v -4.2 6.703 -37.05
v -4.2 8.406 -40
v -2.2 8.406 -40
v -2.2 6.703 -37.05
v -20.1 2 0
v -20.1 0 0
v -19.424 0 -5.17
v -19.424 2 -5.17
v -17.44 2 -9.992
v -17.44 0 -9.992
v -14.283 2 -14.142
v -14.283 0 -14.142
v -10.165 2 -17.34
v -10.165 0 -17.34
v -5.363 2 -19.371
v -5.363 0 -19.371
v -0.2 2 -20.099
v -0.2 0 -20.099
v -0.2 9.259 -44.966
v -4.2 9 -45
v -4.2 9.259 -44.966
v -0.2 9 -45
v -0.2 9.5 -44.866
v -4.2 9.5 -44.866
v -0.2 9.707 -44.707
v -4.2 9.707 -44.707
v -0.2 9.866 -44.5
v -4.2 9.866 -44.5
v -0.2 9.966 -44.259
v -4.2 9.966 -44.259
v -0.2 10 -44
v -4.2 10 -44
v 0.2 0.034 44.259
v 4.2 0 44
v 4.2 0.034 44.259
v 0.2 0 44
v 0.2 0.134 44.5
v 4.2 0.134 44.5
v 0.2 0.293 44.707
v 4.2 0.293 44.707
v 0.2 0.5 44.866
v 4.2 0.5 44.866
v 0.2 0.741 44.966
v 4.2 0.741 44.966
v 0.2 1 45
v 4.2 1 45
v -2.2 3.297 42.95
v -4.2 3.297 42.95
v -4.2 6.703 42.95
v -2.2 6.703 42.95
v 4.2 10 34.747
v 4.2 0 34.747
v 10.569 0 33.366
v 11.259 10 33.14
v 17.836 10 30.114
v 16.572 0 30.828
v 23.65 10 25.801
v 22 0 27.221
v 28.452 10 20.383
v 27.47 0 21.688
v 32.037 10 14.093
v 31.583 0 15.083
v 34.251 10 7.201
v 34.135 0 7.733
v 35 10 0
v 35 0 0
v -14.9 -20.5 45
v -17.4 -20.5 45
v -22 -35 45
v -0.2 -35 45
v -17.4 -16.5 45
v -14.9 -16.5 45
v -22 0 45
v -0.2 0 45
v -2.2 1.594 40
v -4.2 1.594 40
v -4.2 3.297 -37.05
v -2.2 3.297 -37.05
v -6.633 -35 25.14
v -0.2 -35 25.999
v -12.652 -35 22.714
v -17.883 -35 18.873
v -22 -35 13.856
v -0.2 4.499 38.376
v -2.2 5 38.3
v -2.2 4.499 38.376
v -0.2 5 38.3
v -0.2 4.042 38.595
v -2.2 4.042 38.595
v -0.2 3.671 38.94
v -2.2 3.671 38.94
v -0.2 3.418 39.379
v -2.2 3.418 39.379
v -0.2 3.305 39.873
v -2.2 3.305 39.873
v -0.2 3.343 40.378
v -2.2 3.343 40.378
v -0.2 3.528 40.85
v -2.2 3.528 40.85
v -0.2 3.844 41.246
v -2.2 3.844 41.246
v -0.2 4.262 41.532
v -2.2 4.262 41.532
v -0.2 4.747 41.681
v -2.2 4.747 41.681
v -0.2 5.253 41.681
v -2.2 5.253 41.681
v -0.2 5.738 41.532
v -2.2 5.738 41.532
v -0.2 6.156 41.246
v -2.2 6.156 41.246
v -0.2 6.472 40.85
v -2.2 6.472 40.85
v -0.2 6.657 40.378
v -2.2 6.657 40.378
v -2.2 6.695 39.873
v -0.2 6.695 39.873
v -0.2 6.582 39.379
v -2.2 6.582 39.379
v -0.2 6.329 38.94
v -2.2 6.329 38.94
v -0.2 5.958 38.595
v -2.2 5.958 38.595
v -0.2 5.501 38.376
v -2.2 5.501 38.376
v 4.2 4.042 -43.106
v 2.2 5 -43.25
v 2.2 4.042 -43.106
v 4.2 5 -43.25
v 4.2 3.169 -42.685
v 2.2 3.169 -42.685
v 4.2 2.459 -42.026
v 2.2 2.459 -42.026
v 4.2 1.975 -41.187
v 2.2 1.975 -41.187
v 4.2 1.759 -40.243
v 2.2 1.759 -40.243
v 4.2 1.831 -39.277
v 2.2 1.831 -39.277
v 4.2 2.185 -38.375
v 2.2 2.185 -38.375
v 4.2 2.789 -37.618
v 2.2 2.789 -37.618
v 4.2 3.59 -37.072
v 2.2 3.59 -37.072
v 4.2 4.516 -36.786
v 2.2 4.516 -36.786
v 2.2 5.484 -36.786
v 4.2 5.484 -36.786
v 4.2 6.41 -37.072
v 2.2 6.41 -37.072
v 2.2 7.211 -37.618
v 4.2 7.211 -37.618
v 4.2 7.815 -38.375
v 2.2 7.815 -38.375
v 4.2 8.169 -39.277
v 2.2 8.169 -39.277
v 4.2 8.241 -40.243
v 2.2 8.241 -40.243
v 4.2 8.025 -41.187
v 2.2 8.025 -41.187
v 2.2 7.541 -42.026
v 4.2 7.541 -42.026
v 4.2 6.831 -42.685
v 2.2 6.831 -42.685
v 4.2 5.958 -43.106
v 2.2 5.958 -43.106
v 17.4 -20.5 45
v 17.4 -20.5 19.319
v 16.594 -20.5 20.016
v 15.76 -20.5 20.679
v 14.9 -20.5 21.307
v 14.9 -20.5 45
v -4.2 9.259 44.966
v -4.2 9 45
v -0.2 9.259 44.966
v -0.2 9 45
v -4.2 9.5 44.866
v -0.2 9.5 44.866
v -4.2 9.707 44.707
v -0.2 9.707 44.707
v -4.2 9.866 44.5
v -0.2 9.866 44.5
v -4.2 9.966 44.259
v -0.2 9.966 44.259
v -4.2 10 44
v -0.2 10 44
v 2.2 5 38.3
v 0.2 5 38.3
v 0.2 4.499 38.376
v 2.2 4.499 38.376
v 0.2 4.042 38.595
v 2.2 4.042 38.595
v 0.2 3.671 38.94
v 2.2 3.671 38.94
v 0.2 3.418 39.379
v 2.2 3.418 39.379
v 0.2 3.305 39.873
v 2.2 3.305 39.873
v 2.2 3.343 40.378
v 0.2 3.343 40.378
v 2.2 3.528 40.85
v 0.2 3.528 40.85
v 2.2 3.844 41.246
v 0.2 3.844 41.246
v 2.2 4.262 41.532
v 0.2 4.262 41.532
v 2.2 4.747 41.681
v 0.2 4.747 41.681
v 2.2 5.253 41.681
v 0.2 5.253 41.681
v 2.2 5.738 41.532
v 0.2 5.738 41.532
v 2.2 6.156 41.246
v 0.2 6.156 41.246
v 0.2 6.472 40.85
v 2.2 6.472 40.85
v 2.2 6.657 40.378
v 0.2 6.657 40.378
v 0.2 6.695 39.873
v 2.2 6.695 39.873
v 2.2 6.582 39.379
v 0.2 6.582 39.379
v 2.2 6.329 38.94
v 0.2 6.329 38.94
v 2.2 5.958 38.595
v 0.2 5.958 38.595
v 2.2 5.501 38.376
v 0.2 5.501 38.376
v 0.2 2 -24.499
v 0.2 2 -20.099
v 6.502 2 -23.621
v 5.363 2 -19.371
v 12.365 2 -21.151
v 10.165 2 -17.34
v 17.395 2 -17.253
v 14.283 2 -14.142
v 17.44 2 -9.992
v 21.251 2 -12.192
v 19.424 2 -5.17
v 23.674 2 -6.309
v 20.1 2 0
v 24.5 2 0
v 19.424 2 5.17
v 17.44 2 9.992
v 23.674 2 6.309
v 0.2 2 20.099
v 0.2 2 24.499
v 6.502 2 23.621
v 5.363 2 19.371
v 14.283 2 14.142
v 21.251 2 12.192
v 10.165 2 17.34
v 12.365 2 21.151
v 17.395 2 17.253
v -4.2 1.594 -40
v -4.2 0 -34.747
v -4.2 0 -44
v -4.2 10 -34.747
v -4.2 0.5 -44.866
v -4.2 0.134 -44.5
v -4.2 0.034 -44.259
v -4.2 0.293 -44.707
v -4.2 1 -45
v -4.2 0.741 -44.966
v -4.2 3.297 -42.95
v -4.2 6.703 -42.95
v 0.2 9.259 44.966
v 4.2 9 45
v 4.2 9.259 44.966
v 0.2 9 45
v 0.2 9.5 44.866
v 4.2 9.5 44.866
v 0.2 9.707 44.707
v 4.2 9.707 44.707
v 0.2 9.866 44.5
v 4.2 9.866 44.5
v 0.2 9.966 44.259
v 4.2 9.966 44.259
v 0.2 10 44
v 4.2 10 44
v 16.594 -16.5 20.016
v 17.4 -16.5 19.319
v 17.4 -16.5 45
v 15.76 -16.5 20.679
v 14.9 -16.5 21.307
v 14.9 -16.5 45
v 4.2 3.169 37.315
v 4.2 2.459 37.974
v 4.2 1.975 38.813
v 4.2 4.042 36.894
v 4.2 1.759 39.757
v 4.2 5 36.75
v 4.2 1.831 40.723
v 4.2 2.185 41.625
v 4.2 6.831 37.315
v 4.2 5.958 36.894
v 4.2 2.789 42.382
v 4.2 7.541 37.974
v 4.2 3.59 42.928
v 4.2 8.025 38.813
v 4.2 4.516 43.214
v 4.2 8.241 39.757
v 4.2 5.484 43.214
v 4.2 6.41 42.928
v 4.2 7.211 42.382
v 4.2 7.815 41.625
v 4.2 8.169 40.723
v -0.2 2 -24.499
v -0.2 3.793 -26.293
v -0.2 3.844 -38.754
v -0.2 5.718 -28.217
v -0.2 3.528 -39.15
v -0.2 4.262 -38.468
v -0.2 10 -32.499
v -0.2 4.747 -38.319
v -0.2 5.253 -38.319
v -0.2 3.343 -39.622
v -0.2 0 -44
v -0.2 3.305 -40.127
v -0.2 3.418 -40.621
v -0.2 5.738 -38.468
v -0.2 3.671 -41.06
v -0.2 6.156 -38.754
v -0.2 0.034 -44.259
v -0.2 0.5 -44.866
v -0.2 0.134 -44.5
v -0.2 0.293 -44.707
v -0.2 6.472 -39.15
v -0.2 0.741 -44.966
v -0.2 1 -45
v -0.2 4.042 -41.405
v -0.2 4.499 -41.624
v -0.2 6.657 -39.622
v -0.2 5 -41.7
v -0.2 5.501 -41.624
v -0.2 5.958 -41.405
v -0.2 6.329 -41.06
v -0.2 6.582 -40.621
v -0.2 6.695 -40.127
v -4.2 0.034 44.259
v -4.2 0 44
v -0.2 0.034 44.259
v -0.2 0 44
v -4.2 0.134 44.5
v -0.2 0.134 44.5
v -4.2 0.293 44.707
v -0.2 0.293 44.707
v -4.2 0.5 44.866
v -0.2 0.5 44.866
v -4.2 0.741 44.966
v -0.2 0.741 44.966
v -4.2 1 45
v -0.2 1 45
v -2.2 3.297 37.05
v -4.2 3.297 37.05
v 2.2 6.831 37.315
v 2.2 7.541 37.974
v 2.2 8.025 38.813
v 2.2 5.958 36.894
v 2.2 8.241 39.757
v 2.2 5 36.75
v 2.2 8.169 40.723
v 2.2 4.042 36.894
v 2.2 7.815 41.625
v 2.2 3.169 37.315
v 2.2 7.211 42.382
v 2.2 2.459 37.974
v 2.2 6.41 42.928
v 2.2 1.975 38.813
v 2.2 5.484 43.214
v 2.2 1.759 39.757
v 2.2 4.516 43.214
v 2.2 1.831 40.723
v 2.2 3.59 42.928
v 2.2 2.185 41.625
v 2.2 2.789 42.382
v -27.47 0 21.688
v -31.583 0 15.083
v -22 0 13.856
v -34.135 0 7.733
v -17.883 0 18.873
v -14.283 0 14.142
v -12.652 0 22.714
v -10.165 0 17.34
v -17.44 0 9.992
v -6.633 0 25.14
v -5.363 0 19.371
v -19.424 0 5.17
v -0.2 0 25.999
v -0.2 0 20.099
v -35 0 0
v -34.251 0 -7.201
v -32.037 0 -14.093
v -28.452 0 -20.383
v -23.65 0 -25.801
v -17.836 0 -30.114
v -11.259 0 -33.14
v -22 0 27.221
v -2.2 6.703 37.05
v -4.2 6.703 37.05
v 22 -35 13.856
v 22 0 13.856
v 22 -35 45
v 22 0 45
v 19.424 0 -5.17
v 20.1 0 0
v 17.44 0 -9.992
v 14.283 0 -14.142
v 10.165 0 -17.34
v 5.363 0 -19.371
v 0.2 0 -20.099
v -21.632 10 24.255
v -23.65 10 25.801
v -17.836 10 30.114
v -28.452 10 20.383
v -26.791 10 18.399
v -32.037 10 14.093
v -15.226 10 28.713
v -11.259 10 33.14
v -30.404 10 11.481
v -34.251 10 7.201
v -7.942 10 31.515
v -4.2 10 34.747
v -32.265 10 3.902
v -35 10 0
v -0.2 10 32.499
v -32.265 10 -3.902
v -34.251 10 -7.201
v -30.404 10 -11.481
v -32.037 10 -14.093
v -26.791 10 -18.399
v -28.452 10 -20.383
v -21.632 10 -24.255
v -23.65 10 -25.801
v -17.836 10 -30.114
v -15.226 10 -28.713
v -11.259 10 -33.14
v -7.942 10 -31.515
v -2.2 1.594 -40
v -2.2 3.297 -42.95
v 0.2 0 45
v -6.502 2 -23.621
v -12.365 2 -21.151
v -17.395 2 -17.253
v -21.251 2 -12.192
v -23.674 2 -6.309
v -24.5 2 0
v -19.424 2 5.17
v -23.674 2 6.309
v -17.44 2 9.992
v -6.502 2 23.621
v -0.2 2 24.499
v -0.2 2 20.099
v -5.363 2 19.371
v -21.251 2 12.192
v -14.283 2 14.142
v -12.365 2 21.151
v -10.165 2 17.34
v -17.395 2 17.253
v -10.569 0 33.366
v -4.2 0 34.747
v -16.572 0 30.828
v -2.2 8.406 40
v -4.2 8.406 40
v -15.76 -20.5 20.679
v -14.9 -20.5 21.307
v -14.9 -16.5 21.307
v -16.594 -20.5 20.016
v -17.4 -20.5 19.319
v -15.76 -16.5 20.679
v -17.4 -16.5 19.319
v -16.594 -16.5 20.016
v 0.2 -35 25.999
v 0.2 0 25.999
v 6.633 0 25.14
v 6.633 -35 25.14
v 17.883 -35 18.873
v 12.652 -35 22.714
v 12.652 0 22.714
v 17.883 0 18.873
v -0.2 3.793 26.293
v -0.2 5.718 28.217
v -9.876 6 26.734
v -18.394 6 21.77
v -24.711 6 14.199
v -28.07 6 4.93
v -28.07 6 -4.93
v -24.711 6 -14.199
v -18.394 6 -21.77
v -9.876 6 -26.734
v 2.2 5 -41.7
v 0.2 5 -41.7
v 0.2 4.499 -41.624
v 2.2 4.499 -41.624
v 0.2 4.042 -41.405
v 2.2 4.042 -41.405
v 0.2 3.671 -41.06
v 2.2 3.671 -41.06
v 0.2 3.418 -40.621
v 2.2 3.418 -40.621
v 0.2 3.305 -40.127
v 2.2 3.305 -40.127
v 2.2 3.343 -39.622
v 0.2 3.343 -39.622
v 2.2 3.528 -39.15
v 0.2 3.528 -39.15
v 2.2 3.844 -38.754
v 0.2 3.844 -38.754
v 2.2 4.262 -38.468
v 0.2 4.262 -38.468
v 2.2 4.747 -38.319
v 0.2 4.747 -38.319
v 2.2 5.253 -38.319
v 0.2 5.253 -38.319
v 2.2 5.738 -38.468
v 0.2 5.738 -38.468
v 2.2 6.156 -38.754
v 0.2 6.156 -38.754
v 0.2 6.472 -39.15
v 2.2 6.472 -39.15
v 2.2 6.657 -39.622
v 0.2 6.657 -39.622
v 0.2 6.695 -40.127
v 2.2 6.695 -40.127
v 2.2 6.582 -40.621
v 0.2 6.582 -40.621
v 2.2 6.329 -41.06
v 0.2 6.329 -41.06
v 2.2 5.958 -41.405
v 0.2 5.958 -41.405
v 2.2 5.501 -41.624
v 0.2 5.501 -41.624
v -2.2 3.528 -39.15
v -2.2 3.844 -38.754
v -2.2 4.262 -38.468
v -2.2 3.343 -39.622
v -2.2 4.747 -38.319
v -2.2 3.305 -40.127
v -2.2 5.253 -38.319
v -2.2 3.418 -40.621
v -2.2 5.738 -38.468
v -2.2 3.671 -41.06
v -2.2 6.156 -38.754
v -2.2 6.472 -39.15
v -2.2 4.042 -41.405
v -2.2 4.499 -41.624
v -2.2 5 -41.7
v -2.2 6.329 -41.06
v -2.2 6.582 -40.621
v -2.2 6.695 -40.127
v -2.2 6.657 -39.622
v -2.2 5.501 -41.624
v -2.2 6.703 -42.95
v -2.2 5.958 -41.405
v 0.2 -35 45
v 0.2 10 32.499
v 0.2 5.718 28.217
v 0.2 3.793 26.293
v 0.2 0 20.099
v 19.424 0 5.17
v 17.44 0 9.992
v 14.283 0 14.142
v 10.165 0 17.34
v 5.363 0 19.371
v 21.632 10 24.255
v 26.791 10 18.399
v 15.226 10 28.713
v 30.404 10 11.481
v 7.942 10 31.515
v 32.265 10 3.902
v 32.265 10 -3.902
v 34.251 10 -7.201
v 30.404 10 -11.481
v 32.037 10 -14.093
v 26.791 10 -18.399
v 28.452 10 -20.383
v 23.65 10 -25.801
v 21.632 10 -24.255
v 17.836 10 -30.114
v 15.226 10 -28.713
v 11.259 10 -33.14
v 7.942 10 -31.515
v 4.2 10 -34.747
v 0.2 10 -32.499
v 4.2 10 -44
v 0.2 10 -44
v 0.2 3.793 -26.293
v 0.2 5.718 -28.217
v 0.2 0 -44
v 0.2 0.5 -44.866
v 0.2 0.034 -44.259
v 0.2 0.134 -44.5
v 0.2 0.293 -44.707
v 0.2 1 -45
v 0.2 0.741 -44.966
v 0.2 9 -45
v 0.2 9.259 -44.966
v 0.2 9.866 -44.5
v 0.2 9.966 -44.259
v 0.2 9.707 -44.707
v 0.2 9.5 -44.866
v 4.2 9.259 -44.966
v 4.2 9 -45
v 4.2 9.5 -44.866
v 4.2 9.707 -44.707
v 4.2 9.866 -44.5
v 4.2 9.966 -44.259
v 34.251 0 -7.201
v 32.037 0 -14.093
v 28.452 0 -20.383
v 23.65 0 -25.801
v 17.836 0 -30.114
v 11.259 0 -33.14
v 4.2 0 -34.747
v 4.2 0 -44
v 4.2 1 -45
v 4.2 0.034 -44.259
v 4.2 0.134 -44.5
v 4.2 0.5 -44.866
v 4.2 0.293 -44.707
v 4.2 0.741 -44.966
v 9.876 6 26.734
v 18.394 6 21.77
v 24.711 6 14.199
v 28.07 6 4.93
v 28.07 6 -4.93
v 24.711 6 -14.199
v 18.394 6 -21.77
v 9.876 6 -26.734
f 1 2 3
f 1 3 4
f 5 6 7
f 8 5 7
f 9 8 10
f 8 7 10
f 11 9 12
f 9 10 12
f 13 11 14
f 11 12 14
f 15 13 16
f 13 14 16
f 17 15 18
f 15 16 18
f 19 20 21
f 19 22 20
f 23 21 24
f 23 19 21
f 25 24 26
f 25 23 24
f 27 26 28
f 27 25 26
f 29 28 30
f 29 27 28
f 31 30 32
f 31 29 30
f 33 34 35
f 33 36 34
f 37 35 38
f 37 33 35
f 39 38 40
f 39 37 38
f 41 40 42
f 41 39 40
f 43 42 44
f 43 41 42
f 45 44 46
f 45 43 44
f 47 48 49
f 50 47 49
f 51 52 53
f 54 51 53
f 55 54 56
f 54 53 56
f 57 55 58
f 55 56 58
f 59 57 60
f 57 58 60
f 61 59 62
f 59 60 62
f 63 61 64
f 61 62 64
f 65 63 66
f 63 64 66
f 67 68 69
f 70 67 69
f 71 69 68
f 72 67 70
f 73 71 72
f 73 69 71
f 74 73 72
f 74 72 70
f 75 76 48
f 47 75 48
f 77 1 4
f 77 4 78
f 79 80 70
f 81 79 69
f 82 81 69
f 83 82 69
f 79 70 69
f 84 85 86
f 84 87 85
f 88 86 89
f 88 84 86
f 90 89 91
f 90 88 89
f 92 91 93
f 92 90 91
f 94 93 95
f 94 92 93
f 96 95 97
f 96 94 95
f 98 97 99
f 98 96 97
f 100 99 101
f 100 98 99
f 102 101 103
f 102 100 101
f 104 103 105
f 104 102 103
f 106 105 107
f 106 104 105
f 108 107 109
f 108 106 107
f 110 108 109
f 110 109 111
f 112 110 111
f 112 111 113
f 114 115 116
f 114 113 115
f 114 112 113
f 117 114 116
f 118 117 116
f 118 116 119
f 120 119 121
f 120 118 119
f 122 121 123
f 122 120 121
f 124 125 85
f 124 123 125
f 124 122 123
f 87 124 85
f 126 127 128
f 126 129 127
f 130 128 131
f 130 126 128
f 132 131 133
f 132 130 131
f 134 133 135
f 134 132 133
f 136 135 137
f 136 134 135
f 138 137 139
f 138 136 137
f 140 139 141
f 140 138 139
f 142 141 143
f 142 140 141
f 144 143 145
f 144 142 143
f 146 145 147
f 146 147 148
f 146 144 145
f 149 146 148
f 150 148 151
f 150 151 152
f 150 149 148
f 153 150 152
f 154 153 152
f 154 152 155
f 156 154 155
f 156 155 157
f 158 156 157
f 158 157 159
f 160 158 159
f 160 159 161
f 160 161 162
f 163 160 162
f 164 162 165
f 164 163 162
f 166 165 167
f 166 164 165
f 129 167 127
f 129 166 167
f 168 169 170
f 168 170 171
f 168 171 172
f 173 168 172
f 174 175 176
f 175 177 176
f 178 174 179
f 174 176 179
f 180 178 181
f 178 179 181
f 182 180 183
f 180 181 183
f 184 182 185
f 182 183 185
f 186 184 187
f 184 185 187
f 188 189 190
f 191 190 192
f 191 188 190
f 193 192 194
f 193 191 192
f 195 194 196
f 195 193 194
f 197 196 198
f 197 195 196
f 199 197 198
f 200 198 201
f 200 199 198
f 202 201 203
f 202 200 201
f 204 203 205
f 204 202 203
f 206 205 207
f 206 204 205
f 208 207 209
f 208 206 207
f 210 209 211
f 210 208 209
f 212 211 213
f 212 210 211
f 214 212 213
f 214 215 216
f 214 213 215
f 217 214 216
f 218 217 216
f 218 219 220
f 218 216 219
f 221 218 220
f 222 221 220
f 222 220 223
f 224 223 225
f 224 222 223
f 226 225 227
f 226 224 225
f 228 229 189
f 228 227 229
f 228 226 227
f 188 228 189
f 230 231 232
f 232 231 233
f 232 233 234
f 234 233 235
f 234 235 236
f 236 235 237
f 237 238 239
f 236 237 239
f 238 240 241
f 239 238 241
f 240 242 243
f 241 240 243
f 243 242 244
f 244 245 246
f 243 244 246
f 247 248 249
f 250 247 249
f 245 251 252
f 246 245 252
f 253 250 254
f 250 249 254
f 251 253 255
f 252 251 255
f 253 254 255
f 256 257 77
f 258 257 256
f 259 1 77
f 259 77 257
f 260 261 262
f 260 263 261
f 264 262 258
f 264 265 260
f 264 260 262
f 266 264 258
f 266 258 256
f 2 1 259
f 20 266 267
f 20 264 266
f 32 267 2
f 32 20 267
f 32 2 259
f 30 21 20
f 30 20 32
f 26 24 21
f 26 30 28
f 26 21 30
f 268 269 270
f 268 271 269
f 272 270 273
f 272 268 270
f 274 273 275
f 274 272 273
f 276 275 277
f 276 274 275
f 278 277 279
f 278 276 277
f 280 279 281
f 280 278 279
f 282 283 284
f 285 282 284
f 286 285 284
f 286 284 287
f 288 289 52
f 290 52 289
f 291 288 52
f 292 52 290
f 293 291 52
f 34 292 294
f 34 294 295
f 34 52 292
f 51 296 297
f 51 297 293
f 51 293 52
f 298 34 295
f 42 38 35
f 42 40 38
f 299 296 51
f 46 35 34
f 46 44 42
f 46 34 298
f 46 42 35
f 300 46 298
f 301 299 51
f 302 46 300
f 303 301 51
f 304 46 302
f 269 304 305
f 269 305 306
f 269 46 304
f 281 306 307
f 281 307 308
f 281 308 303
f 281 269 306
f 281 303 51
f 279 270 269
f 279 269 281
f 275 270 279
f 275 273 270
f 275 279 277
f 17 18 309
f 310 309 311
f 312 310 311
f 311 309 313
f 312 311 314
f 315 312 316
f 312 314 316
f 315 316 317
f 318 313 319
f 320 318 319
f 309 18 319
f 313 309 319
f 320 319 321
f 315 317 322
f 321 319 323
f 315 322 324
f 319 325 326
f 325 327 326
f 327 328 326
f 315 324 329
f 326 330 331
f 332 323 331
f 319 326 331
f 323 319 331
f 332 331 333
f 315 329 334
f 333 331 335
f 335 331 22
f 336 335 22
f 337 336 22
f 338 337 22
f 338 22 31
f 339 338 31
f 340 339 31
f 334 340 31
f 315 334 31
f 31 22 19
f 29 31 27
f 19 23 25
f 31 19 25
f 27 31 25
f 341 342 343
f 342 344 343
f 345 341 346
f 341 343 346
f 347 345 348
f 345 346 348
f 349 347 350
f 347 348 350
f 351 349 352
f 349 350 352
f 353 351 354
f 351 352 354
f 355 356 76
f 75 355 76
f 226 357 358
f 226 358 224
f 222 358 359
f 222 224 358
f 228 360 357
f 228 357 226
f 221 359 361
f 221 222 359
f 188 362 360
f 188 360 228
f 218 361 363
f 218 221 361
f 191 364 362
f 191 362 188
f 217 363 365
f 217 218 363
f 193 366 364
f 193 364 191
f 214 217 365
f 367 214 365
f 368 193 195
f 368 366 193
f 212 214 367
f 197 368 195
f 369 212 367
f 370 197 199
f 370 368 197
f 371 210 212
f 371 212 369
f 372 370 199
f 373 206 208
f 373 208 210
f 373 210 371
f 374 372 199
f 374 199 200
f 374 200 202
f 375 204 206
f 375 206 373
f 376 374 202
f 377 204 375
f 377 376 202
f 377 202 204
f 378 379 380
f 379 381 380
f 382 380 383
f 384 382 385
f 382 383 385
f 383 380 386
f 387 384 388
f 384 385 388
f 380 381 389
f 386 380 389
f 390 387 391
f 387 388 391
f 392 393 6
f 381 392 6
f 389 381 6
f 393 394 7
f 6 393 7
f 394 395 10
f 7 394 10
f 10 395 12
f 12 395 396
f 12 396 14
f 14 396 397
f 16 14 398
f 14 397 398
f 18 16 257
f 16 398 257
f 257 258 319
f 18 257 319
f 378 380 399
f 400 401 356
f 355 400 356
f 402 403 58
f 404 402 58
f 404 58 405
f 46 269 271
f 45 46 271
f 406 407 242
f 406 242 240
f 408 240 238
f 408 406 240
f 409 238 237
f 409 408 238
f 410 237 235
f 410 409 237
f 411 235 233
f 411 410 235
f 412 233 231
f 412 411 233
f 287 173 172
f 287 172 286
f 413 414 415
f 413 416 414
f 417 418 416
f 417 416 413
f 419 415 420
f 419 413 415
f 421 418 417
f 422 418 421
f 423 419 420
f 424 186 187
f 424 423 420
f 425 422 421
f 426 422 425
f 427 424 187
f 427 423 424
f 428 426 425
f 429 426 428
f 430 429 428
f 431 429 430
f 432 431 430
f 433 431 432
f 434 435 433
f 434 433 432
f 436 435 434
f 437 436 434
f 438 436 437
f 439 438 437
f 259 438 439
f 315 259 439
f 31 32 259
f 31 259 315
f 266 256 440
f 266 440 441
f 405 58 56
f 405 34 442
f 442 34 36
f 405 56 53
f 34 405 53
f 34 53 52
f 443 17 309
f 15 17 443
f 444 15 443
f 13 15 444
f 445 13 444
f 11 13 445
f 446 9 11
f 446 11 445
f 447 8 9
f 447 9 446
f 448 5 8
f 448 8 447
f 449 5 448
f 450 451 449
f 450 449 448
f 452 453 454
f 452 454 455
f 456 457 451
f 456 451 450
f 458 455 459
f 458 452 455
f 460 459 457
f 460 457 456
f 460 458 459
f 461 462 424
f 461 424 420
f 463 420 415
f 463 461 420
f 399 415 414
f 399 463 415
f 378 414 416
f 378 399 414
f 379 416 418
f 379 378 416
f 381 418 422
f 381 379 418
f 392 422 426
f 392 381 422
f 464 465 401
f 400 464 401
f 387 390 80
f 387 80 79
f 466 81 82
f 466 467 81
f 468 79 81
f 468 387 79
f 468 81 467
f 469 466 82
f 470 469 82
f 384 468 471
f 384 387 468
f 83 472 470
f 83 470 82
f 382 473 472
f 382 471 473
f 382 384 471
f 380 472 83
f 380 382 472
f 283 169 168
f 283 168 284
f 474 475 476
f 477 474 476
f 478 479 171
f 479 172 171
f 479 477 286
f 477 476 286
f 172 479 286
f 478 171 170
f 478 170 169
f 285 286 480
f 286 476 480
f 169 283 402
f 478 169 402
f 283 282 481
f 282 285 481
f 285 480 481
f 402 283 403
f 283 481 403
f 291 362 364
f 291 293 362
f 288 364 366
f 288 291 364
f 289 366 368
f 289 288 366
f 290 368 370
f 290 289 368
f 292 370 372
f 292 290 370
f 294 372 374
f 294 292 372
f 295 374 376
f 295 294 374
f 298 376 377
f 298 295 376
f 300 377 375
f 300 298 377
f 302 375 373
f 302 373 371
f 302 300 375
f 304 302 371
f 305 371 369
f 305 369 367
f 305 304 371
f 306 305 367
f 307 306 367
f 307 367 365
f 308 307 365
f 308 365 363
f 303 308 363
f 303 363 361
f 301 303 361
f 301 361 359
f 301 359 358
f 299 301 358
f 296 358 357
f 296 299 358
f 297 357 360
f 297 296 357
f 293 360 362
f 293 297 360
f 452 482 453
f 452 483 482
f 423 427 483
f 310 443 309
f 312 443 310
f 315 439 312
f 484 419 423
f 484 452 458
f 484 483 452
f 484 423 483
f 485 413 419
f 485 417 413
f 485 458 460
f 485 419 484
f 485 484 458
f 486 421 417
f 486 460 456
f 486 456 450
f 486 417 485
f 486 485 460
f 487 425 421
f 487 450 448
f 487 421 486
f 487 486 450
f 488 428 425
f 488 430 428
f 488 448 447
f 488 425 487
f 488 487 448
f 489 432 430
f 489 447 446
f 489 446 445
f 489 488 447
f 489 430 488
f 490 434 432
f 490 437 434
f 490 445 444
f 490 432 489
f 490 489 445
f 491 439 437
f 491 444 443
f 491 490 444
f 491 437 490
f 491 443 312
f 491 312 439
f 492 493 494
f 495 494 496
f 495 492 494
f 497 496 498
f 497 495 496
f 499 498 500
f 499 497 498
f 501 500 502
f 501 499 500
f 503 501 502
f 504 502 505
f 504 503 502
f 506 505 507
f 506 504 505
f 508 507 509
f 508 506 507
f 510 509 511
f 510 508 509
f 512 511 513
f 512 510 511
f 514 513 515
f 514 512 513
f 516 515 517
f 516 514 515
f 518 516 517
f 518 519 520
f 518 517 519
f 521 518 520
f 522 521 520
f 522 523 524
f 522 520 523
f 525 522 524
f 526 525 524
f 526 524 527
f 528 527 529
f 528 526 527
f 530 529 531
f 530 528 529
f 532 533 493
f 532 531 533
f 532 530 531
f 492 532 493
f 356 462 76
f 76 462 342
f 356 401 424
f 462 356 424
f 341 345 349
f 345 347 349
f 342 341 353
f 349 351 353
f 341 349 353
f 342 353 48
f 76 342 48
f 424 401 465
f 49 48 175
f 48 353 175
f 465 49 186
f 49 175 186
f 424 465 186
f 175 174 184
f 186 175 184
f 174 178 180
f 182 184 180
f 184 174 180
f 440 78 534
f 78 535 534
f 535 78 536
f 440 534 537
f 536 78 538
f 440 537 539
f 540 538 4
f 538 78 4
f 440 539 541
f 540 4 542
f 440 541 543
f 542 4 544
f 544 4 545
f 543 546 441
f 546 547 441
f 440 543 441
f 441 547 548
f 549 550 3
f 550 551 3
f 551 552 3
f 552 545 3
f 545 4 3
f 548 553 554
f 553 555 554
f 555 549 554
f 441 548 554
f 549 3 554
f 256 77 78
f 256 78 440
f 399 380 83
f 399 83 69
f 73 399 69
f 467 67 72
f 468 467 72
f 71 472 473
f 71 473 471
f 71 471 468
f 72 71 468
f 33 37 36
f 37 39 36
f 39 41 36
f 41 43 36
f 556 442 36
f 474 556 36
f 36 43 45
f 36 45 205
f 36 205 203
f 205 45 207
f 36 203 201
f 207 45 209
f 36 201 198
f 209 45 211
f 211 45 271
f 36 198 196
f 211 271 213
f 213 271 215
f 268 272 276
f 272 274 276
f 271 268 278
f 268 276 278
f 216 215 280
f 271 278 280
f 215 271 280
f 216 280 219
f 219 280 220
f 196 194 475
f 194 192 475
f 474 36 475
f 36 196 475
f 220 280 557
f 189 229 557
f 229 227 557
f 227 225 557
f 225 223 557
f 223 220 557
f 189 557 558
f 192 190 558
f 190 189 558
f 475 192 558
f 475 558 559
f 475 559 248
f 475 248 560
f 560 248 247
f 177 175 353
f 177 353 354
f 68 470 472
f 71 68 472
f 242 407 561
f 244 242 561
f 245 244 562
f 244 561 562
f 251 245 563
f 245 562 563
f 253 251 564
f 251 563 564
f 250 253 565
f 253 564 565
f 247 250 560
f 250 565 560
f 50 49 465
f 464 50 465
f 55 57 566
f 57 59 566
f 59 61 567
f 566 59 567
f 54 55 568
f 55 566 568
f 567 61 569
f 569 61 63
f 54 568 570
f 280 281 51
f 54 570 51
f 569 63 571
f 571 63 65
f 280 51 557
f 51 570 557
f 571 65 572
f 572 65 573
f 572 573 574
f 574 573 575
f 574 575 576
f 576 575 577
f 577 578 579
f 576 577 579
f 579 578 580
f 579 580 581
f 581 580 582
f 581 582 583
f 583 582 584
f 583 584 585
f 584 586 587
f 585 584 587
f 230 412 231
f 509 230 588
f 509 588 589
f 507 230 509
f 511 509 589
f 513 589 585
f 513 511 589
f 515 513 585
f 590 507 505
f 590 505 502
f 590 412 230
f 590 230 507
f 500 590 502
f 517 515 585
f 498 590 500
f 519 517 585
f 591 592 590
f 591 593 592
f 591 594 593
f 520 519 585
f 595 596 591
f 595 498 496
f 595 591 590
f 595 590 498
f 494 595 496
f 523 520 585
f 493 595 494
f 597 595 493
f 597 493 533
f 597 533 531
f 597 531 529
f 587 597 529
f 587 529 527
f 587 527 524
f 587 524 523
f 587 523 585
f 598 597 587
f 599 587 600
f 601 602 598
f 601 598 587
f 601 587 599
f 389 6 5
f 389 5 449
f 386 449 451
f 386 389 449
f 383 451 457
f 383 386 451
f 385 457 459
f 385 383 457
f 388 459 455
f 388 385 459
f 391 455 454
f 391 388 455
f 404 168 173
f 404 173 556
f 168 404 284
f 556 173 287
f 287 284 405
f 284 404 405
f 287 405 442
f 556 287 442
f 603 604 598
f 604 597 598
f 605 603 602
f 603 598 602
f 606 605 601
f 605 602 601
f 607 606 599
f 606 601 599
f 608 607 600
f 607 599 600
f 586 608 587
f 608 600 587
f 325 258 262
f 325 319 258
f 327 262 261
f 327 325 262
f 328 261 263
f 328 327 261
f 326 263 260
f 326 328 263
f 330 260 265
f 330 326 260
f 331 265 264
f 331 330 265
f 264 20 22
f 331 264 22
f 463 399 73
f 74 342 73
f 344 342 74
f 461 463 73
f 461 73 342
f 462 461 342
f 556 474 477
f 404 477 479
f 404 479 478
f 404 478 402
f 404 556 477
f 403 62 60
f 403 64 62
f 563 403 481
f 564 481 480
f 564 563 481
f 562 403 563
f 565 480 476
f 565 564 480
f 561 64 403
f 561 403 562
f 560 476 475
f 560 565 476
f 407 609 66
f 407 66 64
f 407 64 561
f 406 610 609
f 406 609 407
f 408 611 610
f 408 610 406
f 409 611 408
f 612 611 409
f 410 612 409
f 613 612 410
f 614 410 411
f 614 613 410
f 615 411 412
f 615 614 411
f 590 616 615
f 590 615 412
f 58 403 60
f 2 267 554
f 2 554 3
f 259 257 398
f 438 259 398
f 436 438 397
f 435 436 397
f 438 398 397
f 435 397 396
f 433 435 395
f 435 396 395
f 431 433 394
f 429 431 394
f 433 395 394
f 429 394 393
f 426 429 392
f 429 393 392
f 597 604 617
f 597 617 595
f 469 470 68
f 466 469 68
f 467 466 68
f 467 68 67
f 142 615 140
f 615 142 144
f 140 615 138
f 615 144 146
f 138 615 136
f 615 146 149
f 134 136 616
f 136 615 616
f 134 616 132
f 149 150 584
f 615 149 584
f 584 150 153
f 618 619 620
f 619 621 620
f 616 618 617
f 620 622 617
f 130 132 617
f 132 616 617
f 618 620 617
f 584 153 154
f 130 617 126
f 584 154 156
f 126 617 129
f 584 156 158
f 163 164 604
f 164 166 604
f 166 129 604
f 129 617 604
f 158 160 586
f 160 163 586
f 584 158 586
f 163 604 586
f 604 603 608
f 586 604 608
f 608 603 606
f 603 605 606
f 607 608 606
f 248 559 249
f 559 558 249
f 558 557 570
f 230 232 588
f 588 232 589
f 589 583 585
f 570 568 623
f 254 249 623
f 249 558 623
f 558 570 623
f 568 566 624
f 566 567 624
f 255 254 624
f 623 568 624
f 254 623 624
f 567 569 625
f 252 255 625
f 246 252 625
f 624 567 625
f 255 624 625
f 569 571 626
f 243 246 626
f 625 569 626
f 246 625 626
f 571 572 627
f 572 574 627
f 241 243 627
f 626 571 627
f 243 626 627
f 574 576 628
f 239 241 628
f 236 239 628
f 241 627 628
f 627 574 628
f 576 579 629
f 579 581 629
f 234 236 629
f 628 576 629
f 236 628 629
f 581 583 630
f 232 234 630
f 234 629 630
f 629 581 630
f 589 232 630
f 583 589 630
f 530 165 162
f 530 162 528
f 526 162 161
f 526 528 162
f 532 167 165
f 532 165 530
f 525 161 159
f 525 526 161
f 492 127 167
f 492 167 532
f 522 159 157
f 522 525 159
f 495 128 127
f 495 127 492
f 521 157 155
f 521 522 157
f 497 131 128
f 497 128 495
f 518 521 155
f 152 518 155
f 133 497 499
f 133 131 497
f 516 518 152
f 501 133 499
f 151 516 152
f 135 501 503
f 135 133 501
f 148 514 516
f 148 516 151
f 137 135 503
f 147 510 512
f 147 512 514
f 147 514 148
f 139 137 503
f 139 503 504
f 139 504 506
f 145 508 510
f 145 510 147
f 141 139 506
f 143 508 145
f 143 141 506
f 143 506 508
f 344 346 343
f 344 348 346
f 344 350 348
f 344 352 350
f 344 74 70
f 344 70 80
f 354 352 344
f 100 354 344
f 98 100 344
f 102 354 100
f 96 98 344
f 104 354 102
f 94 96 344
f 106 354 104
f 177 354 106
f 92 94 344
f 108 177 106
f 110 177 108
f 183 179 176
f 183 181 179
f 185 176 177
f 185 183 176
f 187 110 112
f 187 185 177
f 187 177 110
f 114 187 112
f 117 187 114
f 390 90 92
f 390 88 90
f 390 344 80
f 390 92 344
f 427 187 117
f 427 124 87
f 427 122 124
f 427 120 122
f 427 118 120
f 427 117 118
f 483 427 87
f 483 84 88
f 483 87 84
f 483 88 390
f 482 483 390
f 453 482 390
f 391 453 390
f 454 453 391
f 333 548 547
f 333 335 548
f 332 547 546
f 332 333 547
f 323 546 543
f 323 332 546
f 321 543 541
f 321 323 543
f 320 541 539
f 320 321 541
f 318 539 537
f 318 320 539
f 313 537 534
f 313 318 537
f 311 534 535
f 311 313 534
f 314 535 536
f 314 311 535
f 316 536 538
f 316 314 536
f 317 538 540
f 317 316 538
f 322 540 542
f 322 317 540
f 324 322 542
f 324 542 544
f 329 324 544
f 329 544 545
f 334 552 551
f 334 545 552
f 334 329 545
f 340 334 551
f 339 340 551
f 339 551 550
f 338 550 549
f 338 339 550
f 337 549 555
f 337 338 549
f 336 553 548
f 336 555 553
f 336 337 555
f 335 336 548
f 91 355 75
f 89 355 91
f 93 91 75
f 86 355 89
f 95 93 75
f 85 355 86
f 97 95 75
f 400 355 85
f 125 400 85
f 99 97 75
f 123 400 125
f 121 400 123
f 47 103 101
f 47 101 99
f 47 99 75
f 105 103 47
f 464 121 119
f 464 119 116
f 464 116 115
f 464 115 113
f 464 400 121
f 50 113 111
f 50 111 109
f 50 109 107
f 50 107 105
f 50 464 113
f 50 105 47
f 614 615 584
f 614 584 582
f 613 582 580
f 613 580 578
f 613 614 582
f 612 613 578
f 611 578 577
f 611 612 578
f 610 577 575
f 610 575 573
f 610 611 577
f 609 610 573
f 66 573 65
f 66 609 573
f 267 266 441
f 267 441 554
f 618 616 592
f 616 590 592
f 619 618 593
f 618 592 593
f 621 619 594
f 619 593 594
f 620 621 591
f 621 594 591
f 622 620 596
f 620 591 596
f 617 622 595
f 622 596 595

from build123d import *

# Parameters (mm, degrees)
SALIENTE_EXTRUIR1_DEPTH                     = 2
SALIENTE_EXTRUIR3_DEPTH                     = 10
CHAFL_N1_SIZE                               = 10
CROQUIS8_W                                  = 0.2
CROQUIS8_H                                  = 10
CORTAR_EXTRUIR3_DEPTH                       = 51.497524692
CROQUIS9_W                                  = 4
CROQUIS9_H                                  = 10
SALIENTE_EXTRUIR5_DEPTH                     = 10
SALIENTE_EXTRUIR5_DIRECTION_2_REACH         = 52.498
REDONDEO4_R                                 = 1
CROQUIS11_W                                 = 21.8
CROQUIS11_H                                 = 35
SALIENTE_EXTRUIR7_DEPTH                     = 10
SALIENTE_EXTRUIR8_DEPTH                     = 35
CROQUIS13_W                                 = 2.5
CROQUIS13_H                                 = 4
CORTAR_EXTRUIR4_DEPTH                       = 103.713192921
REFRENTADO_PARA_TORNILLO_CON_CABEZA_2_COUNT = 2
REFRENTADO_PARA_TORNILLO_CON_CABEZA_2_PITCH = 80
CORTAR_EXTRUIR5_DEPTH                       = 2


with BuildPart() as part:
    # Croquis1 → Saliente-Extruir1 (new body)
    with BuildSketch(Plane(origin=(0, 0, 0), x_dir=(1, 0, 0), z_dir=(0, 1, 0))):
        with BuildLine():
            Line((-22.5, 0), (-20.1, 0))
            ThreePointArc((-20.1, 0), (-14.212846302, -14.212846302), (0, -20.1))
            Line((0, -20.1), (0, -22.5))
            ThreePointArc((0, -22.5), (-15.909902577, -15.909902577), (-22.5, 0))
        make_face()
    extrude(amount=SALIENTE_EXTRUIR1_DEPTH)

    # Croquis6 → Saliente-Extruir3 (add)
    with BuildSketch(Plane(origin=(0, 0, 0), x_dir=(1, 0, 0), z_dir=(0, 1, 0))):
        with BuildLine():
            Line((-35, 0), (-22.5, 0))
            ThreePointArc((-22.5, 0), (-15.909902577, -15.909902577), (0, -22.5))
            Line((0, -22.5), (0, -35))
            ThreePointArc((0, -35), (-24.748737342, -24.748737342), (-35, 0))
        make_face()
    extrude(amount=SALIENTE_EXTRUIR3_DEPTH)

    # Chaflán1
    # the kernel refuses this chamfer: 10 mm, written as the material it takes off along each edge
    with BuildSketch(Plane(origin=(0, 10, 0), x_dir=(-0.4144760255692251, 0, -0.9100602310992054), z_dir=(0.9100602310992054, 0, -0.4144760255692251))) as chafl_n1_piece_1_section:
        Polygon((22.5, -CHAFL_N1_SIZE), (22.5 + CHAFL_N1_SIZE, 0), (22.5, 0), align=None)
    chafl_n1_piece_1 = revolve(axis=Axis((0, 10, 0), (0, 1, 0)), revolution_arc=221.027352693, mode=Mode.PRIVATE)
    chafl_n1_piece_1 = split(chafl_n1_piece_1, bisect_by=Plane(origin=(-20.16579523, 2, 20.16579523), z_dir=(0, 1, 0)), keep=Keep.TOP, mode=Mode.PRIVATE)
    add(chafl_n1_piece_1, mode=Mode.SUBTRACT)

    # Croquis8 → Cortar-Extruir3 (cut, through all)
    with BuildSketch(Plane.XY.offset(35)):
        with Locations((-0.1, 5)):
            Rectangle(CROQUIS8_W, CROQUIS8_H)
    extrude(amount=-CORTAR_EXTRUIR3_DEPTH, mode=Mode.SUBTRACT)

    # Croquis9 → Saliente-Extruir5 (add)
    with BuildSketch(Plane.XY.offset(35)):
        with Locations((-2.2, 5)):
            Rectangle(CROQUIS9_W, CROQUIS9_H)
    extrude(amount=SALIENTE_EXTRUIR5_DEPTH)

    # Croquis9 → Saliente-Extruir5 direction 2 (add, up to next)
    with BuildSketch(Plane.XY.offset(35), mode=Mode.PRIVATE) as saliente_extruir5_direction_2_sk1:
        with Locations((-2.2, 5)):
            Rectangle(CROQUIS9_W, CROQUIS9_H)
    saliente_extruir5_direction_2_tool1 = extrude(saliente_extruir5_direction_2_sk1.sketch, amount=-SALIENTE_EXTRUIR5_DIRECTION_2_REACH, mode=Mode.PRIVATE) - part.part
    add(saliente_extruir5_direction_2_tool1.solids().sort_by_distance((-2.2, 5, 35))[0])

    # Redondeo4
    redondeo4_edges = [part.edges().sort_by_distance(p)[0] for p in [
        (-2.2, 10, 45),
        (-2.2, 0, 45),
    ]]
    fillet(redondeo4_edges, radius=REDONDEO4_R)

    # Simetría30: part across plane


with BuildPart() as part_1:
    add(part.part)
    add(part.part.mirror(Plane.XY))

    # Croquis11 → Saliente-Extruir7 (add)
    with BuildSketch(Plane.XY.offset(35)):
        with Locations((-11.1, -17.5)):
            Rectangle(CROQUIS11_W, CROQUIS11_H)
    extrude(amount=SALIENTE_EXTRUIR7_DEPTH)

    # Croquis12 → Saliente-Extruir8 (add)
    with BuildSketch(Plane.XZ):
        with BuildLine():
            Line((-0.2, 35), (-0.2, 25.999230758))
            ThreePointArc((-0.2, 25.999230758), (-12.651958168, 22.714047515), (-22, 13.856406461))
            Line((-22, 13.856406461), (-22, 27.221315178))
            Line((-22, 27.221315178), (-22, 35))
            Line((-22, 35), (-0.2, 35))
        make_face()
    extrude(amount=SALIENTE_EXTRUIR8_DEPTH)

    # Croquis13 → Cortar-Extruir4 (cut, through all)
    with BuildSketch(Plane.XY.offset(45)):
        with Locations((-16.15, -18.5)):
            Rectangle(CROQUIS13_W, CROQUIS13_H)
    extrude(amount=-CORTAR_EXTRUIR4_DEPTH, mode=Mode.SUBTRACT)


with BuildPart() as body_2:
    # Simetría32: mirrored copy
    add(part_1.part.mirror(Plane(origin=(0, 0, 0), x_dir=(0, 0, 1), z_dir=(1, 0, 0))))


with BuildPart() as refrentado_para_tornillo_con_cabeza_plan_tool:
    # Croquis15 → Refrentado para tornillo con cabeza plana de M31 (revolve)
    with BuildSketch(Plane(origin=(4.2, 5, 40), x_dir=(0, 0, -1), z_dir=(0, 1, 0))):
        Polygon((0, 0), (0, 39.2), (1.7, 39.2), (1.7, 2), (3.25, 2), (3.25, 0), align=None)
    refrentado_para_tornillo_con_cabeza_plan = revolve(axis=Axis((10.55, 5, 40), (-1, 0, 0)))


with BuildPart() as part_2:
    add(part_1.part)

    # Refrentado para tornillo con cabeza plana de M31: cut by refrentado_para_tornillo_con_cabeza_plan_tool
    add(refrentado_para_tornillo_con_cabeza_plan_tool.part, mode=Mode.SUBTRACT)


with BuildPart() as body_2_1:
    add(body_2.part)

    # Refrentado para tornillo con cabeza plana de M31: cut by refrentado_para_tornillo_con_cabeza_plan_tool
    add(refrentado_para_tornillo_con_cabeza_plan_tool.part, mode=Mode.SUBTRACT)


with BuildPart() as refrentado_para_tornillo_con_cabeza_2_tool:
    # Refrentado para tornillo con cabeza  2: Refrentado para tornillo con cabeza plana de M31 ×2
    with Locations(*[(0, 0, -i * REFRENTADO_PARA_TORNILLO_CON_CABEZA_2_PITCH) for i in range(1, REFRENTADO_PARA_TORNILLO_CON_CABEZA_2_COUNT)]):
        add(refrentado_para_tornillo_con_cabeza_plan)


with BuildPart() as part_3:
    add(part_2.part)

    # Refrentado para tornillo con cabeza  2: cut by refrentado_para_tornillo_con_cabeza_2_tool
    add(refrentado_para_tornillo_con_cabeza_2_tool.part, mode=Mode.SUBTRACT)

    # Croquis17 → Cortar-Extruir5 (cut)
    with BuildSketch(Plane.ZY.offset(4.2)):
        Polygon((40, 8.406366588), (37.05, 6.703183294), (37.05, 3.296816706), (40, 1.593633412), (42.95, 3.296816706), (42.95, 6.703183294), align=None)
    cortar_extruir5 = extrude(amount=-CORTAR_EXTRUIR5_DEPTH, mode=Mode.SUBTRACT)

    # Simetría33: Cortar-Extruir5 across plane
    add(cortar_extruir5.mirror(Plane.XY), mode=Mode.SUBTRACT)


with BuildPart() as body_2_2:
    add(body_2_1.part)

    # Refrentado para tornillo con cabeza  2: cut by refrentado_para_tornillo_con_cabeza_2_tool
    add(refrentado_para_tornillo_con_cabeza_2_tool.part, mode=Mode.SUBTRACT)


solid = Compound([part_3.part, body_2_2.part])
